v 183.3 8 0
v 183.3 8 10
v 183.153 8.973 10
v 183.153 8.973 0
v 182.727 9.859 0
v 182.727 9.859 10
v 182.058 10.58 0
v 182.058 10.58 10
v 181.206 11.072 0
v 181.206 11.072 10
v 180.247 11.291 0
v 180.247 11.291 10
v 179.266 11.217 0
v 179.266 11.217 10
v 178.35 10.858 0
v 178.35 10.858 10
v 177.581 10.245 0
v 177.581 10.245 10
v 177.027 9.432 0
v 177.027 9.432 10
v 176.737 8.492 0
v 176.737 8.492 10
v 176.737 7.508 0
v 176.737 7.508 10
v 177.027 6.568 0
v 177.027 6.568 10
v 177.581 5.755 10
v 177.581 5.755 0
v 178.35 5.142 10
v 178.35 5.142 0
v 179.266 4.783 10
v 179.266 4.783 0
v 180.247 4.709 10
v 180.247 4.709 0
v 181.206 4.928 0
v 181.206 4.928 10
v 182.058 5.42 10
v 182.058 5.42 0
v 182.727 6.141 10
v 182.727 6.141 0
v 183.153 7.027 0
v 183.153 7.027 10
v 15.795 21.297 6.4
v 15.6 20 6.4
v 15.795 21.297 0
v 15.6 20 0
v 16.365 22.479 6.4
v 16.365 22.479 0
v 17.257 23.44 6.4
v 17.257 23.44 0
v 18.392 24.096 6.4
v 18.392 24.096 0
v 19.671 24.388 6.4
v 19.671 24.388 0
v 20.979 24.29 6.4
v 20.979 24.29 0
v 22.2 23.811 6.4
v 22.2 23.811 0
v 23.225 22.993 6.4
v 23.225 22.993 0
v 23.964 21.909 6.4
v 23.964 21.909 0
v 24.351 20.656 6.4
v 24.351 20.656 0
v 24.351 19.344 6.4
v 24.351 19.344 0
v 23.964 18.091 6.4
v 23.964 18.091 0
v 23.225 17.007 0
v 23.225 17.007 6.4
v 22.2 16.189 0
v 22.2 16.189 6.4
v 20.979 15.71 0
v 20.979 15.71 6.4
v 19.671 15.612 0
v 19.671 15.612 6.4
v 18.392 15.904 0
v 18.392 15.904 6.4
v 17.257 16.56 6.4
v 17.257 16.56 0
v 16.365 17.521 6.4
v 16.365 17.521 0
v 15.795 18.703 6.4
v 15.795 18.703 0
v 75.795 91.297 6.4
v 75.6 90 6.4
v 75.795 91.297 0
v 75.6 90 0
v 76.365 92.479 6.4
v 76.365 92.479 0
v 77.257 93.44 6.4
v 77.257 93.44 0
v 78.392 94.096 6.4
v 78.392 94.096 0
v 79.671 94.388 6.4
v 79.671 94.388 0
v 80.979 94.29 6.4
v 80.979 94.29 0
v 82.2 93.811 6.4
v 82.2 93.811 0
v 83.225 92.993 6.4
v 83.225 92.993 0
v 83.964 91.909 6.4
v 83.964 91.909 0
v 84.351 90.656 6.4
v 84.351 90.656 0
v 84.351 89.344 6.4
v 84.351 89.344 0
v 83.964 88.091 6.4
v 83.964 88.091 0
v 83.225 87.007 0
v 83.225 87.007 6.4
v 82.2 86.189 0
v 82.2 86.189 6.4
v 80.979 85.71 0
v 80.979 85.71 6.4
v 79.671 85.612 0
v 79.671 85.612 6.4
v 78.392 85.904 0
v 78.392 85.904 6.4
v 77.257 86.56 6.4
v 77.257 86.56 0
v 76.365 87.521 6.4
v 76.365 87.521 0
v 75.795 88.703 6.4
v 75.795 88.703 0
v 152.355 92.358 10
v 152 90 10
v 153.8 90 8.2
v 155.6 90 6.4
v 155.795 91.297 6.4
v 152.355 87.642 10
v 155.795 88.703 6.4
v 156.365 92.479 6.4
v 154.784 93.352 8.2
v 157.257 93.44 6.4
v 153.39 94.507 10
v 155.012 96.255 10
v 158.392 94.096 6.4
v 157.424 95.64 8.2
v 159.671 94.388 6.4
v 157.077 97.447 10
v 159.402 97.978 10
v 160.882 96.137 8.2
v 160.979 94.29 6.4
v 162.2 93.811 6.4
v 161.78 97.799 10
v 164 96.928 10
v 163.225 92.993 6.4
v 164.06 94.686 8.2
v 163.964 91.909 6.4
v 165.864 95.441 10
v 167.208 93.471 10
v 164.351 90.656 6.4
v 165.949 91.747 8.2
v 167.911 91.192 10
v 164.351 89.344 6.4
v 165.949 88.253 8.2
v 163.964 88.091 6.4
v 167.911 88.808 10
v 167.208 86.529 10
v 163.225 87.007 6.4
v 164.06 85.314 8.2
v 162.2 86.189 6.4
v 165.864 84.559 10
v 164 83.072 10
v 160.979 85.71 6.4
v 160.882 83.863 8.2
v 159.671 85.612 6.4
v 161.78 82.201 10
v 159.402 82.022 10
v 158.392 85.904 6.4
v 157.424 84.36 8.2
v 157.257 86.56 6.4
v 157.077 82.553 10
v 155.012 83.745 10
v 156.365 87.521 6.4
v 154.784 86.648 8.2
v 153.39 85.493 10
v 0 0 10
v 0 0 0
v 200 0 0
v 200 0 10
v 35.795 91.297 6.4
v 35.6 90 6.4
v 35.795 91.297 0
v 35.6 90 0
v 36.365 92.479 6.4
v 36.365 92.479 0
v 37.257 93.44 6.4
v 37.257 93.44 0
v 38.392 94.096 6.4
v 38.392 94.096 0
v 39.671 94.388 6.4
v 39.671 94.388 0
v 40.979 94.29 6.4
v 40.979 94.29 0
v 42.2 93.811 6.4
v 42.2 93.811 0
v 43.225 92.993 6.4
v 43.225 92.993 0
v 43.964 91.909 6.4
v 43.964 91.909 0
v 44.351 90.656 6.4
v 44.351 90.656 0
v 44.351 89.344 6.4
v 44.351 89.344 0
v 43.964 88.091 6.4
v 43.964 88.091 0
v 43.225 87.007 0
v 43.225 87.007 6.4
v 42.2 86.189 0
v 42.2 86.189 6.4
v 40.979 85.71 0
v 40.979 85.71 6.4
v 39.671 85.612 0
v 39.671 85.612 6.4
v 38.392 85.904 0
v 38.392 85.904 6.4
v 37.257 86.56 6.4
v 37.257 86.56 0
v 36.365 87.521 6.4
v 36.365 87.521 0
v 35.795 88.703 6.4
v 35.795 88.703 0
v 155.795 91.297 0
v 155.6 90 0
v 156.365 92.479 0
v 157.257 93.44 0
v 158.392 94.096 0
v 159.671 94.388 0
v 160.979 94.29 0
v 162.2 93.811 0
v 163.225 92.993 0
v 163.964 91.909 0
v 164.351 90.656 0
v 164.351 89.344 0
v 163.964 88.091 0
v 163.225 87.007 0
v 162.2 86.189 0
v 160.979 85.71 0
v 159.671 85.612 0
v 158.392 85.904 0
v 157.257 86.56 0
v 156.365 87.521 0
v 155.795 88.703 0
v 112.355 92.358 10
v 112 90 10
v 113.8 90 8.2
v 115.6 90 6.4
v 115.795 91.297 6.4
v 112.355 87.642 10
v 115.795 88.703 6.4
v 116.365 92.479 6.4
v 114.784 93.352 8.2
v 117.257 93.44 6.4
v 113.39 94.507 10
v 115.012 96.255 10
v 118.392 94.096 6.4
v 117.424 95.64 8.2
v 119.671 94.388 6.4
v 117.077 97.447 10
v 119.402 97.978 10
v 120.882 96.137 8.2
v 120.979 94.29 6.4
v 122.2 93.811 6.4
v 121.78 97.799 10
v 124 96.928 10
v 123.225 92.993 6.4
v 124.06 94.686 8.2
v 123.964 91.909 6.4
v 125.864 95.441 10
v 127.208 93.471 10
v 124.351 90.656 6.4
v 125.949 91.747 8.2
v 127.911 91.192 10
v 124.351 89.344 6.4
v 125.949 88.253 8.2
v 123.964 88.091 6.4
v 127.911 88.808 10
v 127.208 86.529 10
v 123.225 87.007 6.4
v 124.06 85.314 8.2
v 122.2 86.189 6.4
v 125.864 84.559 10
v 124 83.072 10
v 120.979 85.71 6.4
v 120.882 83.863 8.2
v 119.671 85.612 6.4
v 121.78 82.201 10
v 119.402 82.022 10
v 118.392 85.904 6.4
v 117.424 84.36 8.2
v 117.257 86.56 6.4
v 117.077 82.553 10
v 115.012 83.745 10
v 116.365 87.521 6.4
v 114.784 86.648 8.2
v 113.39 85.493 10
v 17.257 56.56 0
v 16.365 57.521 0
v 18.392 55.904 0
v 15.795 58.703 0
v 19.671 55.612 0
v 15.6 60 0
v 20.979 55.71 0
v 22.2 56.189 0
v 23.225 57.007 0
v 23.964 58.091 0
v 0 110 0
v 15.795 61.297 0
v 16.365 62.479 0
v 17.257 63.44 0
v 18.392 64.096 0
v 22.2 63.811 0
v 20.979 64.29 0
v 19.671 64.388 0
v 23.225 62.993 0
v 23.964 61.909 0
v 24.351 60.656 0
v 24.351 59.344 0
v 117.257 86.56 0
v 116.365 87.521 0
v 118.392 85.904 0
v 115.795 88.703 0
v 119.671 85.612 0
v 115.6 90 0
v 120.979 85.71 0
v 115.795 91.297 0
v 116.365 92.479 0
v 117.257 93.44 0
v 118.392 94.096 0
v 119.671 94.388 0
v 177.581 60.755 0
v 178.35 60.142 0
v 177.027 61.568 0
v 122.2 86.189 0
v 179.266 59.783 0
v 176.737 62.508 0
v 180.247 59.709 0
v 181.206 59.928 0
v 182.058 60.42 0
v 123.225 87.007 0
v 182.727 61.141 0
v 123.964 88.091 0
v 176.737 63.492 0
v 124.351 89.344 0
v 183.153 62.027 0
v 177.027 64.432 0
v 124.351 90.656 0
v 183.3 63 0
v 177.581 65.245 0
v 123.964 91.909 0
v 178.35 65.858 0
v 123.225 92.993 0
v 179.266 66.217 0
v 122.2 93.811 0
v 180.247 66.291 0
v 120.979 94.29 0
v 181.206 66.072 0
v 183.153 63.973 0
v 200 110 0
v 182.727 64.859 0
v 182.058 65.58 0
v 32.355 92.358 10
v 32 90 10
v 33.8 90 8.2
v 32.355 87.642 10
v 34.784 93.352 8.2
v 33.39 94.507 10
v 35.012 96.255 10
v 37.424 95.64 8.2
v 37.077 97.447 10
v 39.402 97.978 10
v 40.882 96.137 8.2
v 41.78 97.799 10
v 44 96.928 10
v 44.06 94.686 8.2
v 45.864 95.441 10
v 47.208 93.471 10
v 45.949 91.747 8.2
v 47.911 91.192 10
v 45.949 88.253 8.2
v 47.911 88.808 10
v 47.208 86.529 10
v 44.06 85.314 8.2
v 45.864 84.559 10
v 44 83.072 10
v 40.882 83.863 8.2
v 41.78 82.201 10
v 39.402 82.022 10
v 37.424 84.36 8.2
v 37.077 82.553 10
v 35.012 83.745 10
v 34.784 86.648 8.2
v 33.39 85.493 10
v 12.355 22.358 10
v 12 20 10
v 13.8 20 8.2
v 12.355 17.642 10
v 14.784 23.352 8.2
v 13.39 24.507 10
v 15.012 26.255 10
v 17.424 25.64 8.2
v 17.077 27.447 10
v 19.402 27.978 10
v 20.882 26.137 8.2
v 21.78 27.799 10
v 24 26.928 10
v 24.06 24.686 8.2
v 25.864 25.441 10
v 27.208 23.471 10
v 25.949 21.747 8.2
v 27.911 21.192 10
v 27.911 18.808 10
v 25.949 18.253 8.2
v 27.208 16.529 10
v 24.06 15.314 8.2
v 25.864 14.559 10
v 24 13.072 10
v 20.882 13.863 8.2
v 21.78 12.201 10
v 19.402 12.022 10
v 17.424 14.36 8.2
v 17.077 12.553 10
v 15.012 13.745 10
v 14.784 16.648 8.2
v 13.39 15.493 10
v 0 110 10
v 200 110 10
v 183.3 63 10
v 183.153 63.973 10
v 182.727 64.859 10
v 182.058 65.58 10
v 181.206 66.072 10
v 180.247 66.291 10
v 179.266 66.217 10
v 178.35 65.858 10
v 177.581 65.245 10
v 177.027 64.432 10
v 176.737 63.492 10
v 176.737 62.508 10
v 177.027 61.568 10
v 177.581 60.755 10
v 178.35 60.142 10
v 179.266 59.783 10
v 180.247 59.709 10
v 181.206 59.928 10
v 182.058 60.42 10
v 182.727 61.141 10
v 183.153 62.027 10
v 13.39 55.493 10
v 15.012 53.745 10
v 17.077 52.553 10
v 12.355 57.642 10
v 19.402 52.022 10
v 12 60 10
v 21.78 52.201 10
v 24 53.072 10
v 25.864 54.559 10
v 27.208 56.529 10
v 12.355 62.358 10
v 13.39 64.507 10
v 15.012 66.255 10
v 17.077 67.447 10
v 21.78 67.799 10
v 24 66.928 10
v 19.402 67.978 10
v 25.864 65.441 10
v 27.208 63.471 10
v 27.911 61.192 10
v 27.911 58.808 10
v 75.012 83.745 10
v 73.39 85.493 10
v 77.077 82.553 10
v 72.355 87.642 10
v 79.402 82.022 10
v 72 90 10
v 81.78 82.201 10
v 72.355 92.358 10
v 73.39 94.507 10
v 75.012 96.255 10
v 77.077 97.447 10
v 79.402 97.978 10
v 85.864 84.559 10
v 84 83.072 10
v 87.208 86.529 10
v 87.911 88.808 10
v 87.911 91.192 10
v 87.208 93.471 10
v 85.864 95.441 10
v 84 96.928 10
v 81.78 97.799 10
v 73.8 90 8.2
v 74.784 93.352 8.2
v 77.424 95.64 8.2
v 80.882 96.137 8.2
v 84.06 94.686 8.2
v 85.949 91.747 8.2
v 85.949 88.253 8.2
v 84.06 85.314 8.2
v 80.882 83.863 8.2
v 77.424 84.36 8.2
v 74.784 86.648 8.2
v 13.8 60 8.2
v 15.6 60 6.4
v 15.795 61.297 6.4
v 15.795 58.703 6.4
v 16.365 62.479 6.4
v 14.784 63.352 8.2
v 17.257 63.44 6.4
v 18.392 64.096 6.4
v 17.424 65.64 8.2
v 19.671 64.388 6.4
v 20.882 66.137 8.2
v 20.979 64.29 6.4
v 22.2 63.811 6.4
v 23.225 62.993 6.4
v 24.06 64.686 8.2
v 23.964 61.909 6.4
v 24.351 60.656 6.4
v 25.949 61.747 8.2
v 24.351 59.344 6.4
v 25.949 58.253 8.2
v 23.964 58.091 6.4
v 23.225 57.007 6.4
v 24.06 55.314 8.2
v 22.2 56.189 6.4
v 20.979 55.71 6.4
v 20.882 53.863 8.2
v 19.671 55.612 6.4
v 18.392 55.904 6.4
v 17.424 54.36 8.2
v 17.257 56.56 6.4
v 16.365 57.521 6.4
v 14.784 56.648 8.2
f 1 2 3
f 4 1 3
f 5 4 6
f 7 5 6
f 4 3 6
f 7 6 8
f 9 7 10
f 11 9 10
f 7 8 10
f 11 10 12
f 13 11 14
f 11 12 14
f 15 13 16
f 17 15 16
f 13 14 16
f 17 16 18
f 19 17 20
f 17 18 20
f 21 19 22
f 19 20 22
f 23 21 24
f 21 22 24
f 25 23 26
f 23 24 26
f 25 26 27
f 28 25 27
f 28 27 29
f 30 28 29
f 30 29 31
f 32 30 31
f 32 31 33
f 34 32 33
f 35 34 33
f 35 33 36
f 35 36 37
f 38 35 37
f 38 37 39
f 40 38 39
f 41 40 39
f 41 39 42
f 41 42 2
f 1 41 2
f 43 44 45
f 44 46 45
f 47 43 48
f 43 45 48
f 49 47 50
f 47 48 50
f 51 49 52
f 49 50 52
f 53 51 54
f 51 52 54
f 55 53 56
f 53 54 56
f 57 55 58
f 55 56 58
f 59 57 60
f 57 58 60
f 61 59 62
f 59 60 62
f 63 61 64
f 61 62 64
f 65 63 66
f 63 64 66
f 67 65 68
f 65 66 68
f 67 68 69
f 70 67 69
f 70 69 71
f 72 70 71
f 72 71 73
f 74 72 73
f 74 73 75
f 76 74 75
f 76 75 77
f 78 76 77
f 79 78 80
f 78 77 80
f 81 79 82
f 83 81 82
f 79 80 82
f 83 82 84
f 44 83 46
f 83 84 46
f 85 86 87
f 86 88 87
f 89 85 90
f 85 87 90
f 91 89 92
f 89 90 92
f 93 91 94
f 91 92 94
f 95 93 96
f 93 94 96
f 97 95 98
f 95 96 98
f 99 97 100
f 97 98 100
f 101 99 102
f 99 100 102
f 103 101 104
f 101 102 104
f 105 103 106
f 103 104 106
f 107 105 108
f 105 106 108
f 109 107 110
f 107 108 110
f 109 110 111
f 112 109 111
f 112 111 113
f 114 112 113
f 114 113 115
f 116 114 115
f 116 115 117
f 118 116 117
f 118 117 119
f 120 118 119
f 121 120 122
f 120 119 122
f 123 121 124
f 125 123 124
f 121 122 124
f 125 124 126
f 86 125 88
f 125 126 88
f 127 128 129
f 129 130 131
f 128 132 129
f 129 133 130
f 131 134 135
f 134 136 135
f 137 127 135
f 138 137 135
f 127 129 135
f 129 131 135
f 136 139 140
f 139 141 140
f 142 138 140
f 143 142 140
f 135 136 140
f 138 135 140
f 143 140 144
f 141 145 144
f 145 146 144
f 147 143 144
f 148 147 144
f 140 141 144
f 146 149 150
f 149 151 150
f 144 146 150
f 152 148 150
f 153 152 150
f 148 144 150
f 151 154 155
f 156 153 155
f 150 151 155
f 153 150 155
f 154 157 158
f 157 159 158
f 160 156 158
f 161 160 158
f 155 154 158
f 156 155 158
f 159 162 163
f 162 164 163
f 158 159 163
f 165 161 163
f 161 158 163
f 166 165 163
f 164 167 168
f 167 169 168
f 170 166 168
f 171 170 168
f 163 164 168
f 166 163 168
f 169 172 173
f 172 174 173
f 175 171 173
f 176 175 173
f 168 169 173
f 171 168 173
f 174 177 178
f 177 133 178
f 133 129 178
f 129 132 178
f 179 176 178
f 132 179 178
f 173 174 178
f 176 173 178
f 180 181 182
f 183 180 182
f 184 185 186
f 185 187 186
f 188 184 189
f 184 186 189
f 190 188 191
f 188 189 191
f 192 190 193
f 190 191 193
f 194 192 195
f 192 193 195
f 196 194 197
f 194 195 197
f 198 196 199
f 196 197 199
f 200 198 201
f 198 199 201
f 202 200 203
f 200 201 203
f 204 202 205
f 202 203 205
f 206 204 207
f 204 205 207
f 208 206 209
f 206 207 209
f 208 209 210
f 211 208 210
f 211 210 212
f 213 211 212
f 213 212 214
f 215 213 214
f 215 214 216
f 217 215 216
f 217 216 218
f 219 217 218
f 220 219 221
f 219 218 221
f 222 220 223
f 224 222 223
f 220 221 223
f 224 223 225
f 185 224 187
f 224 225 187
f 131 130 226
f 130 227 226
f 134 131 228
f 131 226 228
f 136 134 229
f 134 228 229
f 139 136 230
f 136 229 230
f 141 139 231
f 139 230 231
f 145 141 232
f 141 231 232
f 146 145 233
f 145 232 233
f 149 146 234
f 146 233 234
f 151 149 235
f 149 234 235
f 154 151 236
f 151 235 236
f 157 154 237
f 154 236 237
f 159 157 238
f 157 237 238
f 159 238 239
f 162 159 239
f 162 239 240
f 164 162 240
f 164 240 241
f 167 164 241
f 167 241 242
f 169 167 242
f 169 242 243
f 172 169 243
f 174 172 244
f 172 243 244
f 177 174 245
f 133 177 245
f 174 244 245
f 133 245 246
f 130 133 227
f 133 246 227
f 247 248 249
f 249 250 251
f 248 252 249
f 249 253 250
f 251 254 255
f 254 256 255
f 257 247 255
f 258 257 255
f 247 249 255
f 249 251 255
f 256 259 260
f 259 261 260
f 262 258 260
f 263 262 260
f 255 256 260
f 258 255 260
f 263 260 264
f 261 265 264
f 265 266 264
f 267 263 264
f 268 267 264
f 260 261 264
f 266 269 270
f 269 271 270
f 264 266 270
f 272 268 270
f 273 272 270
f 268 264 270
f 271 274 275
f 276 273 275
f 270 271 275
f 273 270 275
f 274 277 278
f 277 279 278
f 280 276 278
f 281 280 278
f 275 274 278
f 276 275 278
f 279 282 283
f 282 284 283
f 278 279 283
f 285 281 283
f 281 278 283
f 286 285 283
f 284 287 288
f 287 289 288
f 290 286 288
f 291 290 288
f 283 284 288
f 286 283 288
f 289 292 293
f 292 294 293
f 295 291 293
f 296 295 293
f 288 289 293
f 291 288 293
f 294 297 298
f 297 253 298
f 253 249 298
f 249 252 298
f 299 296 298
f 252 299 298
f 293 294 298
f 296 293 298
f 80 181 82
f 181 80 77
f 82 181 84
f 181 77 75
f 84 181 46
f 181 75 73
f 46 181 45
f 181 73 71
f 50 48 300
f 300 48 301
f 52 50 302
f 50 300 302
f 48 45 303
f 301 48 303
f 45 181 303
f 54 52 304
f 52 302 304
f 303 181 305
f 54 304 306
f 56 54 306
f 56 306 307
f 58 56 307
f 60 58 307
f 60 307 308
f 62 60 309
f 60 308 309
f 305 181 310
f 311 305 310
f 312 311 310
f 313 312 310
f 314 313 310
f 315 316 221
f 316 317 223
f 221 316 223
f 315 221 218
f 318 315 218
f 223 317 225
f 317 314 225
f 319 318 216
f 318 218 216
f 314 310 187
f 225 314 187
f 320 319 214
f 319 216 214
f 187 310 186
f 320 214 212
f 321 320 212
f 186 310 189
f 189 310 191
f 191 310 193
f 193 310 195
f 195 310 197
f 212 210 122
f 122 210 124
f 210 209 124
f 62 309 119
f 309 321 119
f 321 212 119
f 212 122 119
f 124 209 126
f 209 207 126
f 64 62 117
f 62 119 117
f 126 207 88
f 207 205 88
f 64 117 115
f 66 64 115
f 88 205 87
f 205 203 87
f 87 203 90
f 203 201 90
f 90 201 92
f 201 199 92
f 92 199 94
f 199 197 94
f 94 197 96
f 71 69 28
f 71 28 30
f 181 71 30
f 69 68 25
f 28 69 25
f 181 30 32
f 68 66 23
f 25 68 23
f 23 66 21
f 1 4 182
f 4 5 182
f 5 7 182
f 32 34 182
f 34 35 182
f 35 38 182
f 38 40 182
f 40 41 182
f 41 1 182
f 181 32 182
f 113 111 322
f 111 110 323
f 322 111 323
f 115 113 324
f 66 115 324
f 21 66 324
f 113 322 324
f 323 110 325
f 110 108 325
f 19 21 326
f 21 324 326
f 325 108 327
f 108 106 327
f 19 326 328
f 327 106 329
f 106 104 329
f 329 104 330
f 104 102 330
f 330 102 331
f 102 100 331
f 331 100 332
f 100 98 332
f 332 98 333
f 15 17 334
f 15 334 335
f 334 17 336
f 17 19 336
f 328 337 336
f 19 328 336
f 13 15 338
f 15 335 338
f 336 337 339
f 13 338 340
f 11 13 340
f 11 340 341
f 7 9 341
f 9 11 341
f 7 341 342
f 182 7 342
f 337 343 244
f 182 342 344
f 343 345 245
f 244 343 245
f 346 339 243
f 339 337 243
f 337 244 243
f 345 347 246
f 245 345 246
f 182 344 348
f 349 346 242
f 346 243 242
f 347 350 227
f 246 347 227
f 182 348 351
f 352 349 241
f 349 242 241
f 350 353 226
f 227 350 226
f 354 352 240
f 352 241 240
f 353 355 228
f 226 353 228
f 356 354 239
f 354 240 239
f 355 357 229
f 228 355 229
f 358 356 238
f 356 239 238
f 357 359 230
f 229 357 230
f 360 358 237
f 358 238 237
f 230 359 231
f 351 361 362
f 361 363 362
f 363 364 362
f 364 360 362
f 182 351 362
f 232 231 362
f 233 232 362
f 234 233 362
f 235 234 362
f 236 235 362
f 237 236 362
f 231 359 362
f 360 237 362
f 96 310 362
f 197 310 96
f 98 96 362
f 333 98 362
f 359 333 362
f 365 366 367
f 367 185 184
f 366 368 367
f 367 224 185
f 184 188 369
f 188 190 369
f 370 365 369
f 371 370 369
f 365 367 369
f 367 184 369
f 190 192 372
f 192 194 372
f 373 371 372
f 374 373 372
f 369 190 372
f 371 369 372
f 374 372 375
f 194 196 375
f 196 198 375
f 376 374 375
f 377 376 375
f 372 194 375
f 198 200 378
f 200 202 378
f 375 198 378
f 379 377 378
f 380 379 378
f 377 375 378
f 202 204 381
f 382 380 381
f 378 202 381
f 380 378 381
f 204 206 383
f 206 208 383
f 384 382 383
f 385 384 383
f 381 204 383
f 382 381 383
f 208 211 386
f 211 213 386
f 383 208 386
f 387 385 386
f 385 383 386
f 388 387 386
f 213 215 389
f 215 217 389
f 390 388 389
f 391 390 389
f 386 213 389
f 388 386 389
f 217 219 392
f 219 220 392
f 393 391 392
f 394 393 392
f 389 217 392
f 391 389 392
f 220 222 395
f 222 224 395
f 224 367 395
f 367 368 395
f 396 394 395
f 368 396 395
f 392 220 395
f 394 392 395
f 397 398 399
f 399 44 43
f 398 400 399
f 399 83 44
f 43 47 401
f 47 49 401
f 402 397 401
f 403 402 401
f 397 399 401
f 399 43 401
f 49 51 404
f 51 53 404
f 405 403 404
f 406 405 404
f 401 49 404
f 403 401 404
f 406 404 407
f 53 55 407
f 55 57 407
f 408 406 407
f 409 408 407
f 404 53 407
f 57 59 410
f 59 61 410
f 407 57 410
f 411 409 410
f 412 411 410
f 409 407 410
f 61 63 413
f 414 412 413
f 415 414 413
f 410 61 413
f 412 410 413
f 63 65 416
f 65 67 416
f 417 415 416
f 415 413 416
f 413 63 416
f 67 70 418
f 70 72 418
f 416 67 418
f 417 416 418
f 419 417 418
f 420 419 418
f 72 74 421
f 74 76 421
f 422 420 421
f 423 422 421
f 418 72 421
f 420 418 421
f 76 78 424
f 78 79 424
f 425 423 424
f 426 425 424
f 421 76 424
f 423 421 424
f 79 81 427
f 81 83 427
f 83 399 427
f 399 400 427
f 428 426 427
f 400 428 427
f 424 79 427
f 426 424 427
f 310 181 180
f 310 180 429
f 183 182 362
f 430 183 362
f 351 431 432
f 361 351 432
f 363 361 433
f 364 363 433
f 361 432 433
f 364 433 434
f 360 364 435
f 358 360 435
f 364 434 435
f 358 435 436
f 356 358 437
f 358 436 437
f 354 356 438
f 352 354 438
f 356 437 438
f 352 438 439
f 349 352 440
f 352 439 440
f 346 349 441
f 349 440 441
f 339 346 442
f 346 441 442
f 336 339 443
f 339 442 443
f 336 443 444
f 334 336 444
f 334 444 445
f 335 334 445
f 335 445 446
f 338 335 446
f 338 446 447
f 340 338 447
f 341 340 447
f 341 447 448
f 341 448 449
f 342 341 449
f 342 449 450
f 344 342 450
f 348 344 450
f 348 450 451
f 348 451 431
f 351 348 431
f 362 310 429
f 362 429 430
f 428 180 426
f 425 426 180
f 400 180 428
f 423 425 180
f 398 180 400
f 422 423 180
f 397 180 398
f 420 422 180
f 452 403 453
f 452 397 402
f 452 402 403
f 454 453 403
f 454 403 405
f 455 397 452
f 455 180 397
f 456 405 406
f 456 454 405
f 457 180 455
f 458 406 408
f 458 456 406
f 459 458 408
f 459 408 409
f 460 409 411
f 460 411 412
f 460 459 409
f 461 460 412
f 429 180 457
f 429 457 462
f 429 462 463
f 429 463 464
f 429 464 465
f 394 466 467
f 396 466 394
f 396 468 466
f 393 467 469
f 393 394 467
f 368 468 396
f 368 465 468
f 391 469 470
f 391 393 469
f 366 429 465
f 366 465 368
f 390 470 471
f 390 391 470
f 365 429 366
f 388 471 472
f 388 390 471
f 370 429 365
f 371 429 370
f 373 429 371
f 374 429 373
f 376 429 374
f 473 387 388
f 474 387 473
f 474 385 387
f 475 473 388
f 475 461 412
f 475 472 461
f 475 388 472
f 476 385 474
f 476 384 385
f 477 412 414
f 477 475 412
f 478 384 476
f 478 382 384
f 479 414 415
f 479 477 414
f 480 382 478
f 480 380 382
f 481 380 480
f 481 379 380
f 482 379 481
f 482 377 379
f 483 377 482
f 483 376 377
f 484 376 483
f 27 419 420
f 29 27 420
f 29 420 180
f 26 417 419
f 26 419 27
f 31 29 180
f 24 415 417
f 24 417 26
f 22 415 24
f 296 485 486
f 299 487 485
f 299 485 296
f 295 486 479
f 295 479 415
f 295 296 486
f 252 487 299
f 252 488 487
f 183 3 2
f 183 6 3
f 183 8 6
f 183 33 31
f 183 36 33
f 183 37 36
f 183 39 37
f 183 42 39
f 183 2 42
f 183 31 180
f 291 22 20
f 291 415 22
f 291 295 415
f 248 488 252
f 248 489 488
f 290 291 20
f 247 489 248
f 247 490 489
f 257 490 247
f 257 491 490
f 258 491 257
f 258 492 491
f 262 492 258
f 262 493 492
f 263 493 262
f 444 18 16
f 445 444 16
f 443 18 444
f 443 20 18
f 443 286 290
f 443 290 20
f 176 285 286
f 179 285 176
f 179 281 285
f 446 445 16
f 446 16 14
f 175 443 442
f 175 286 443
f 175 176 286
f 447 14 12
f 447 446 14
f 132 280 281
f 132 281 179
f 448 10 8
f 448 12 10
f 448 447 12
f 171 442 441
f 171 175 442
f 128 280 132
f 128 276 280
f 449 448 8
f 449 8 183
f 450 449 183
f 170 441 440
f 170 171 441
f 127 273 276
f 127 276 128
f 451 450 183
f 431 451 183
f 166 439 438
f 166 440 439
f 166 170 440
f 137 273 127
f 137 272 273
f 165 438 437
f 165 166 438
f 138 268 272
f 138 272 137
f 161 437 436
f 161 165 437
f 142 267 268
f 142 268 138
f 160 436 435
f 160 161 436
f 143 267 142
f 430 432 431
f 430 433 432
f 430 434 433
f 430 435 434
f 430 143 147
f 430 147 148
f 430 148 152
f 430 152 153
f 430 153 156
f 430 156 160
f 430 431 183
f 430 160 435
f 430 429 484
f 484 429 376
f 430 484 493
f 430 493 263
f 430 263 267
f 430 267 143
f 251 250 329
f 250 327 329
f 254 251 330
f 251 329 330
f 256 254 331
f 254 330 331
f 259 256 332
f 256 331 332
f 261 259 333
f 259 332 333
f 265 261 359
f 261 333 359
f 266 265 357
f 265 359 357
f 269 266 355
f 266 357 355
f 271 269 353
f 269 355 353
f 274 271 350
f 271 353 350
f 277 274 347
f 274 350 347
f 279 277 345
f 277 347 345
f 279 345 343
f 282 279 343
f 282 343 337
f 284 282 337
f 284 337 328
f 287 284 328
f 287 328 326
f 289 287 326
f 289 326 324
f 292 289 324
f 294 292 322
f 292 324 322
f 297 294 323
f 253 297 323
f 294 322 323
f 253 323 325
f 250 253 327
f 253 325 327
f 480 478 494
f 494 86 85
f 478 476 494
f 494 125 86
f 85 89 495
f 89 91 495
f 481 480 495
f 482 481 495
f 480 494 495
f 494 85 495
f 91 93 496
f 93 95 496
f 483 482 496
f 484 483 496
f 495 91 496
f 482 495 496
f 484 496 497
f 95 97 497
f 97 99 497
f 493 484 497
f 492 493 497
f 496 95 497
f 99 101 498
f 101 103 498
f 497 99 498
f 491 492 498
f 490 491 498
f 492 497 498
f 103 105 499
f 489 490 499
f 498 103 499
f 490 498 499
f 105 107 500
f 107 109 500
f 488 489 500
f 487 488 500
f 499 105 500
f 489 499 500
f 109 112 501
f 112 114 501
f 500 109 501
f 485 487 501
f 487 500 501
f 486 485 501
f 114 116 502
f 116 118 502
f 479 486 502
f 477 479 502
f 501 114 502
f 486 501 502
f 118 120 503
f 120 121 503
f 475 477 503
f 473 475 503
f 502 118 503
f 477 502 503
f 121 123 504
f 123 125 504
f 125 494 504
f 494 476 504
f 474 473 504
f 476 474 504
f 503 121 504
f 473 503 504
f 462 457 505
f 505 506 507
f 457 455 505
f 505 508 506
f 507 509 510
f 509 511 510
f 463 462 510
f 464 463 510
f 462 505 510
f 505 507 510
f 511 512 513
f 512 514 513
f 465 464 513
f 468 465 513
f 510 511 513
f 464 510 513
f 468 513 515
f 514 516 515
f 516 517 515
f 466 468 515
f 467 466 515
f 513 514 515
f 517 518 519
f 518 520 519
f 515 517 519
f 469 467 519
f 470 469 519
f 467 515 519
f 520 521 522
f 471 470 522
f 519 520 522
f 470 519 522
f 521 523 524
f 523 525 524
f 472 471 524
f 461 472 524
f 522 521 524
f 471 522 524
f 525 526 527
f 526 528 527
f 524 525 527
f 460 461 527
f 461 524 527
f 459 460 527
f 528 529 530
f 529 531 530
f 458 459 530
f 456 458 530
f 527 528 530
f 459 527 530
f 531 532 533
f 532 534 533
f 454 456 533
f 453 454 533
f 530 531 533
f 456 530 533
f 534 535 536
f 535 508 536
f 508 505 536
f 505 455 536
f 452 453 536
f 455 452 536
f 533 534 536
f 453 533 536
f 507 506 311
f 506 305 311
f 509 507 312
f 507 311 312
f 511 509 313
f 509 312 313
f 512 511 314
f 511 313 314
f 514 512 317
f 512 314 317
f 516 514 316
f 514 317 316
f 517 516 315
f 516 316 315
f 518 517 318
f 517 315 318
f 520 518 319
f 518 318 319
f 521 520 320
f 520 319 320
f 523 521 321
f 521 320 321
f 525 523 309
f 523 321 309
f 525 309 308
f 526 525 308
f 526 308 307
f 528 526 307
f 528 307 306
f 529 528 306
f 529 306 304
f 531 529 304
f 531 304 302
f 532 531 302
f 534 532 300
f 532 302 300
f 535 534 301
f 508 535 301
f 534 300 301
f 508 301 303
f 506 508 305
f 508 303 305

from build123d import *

# Parameters (mm, degrees)
SKETCH_W               = 200
SKETCH_H               = 110
PAD_DEPTH              = 10
HOLE_D                 = 8.8
HOLE_CSINK_D           = 16
HOLE_CSINK_ANGLE       = 90
LINEARPATTERN_COUNT    = 2
LINEARPATTERN_PITCH    = 40
SKETCH002_R            = 3.3
HOLE001_DEPTH          = 10.001
LINEARPATTERN001_COUNT = 2
LINEARPATTERN001_PITCH = 55
HOLE002_D              = 8.8
HOLE002_CSINK_D        = 16
HOLE002_CSINK_ANGLE    = 90
LINEARPATTERN002_COUNT = 4
LINEARPATTERN002_PITCH = 40


with BuildPart() as part:
    # Sketch → Pad (new body)
    with BuildSketch(Plane.XY):
        with Locations((100, 55)):
            Rectangle(SKETCH_W, SKETCH_H)
    extrude(amount=PAD_DEPTH)

    # Hole (through all)
    with Locations(Plane.XY.offset(10)):
        with Locations((20, 20)):
            hole = CounterSinkHole(HOLE_D / 2, HOLE_CSINK_D / 2, counter_sink_angle=HOLE_CSINK_ANGLE)

    # LinearPattern: Hole ×2
    with Locations(*[(0, i * LINEARPATTERN_PITCH, 0) for i in range(1, LINEARPATTERN_COUNT)]):
        add(hole, mode=Mode.SUBTRACT)

    # Sketch002 → Hole001 (cut, through all)
    with BuildSketch(Plane.XY.offset(10)):
        with Locations((180, 63)):
            Circle(SKETCH002_R)
    hole001 = extrude(amount=-HOLE001_DEPTH, mode=Mode.SUBTRACT)

    # LinearPattern001: Hole001 ×2
    with Locations(*[(0, -i * LINEARPATTERN001_PITCH, 0) for i in range(1, LINEARPATTERN001_COUNT)]):
        add(hole001, mode=Mode.SUBTRACT)

    # Hole002 (through all)
    with Locations(Plane.XY.offset(10)):
        with Locations((40, 90)):
            hole002 = CounterSinkHole(HOLE002_D / 2, HOLE002_CSINK_D / 2, counter_sink_angle=HOLE002_CSINK_ANGLE)

    # LinearPattern002: Hole002 ×4
    with Locations(*[(i * LINEARPATTERN002_PITCH, 0, 0) for i in range(1, LINEARPATTERN002_COUNT)]):
        add(hole002, mode=Mode.SUBTRACT)


solid = part.part
